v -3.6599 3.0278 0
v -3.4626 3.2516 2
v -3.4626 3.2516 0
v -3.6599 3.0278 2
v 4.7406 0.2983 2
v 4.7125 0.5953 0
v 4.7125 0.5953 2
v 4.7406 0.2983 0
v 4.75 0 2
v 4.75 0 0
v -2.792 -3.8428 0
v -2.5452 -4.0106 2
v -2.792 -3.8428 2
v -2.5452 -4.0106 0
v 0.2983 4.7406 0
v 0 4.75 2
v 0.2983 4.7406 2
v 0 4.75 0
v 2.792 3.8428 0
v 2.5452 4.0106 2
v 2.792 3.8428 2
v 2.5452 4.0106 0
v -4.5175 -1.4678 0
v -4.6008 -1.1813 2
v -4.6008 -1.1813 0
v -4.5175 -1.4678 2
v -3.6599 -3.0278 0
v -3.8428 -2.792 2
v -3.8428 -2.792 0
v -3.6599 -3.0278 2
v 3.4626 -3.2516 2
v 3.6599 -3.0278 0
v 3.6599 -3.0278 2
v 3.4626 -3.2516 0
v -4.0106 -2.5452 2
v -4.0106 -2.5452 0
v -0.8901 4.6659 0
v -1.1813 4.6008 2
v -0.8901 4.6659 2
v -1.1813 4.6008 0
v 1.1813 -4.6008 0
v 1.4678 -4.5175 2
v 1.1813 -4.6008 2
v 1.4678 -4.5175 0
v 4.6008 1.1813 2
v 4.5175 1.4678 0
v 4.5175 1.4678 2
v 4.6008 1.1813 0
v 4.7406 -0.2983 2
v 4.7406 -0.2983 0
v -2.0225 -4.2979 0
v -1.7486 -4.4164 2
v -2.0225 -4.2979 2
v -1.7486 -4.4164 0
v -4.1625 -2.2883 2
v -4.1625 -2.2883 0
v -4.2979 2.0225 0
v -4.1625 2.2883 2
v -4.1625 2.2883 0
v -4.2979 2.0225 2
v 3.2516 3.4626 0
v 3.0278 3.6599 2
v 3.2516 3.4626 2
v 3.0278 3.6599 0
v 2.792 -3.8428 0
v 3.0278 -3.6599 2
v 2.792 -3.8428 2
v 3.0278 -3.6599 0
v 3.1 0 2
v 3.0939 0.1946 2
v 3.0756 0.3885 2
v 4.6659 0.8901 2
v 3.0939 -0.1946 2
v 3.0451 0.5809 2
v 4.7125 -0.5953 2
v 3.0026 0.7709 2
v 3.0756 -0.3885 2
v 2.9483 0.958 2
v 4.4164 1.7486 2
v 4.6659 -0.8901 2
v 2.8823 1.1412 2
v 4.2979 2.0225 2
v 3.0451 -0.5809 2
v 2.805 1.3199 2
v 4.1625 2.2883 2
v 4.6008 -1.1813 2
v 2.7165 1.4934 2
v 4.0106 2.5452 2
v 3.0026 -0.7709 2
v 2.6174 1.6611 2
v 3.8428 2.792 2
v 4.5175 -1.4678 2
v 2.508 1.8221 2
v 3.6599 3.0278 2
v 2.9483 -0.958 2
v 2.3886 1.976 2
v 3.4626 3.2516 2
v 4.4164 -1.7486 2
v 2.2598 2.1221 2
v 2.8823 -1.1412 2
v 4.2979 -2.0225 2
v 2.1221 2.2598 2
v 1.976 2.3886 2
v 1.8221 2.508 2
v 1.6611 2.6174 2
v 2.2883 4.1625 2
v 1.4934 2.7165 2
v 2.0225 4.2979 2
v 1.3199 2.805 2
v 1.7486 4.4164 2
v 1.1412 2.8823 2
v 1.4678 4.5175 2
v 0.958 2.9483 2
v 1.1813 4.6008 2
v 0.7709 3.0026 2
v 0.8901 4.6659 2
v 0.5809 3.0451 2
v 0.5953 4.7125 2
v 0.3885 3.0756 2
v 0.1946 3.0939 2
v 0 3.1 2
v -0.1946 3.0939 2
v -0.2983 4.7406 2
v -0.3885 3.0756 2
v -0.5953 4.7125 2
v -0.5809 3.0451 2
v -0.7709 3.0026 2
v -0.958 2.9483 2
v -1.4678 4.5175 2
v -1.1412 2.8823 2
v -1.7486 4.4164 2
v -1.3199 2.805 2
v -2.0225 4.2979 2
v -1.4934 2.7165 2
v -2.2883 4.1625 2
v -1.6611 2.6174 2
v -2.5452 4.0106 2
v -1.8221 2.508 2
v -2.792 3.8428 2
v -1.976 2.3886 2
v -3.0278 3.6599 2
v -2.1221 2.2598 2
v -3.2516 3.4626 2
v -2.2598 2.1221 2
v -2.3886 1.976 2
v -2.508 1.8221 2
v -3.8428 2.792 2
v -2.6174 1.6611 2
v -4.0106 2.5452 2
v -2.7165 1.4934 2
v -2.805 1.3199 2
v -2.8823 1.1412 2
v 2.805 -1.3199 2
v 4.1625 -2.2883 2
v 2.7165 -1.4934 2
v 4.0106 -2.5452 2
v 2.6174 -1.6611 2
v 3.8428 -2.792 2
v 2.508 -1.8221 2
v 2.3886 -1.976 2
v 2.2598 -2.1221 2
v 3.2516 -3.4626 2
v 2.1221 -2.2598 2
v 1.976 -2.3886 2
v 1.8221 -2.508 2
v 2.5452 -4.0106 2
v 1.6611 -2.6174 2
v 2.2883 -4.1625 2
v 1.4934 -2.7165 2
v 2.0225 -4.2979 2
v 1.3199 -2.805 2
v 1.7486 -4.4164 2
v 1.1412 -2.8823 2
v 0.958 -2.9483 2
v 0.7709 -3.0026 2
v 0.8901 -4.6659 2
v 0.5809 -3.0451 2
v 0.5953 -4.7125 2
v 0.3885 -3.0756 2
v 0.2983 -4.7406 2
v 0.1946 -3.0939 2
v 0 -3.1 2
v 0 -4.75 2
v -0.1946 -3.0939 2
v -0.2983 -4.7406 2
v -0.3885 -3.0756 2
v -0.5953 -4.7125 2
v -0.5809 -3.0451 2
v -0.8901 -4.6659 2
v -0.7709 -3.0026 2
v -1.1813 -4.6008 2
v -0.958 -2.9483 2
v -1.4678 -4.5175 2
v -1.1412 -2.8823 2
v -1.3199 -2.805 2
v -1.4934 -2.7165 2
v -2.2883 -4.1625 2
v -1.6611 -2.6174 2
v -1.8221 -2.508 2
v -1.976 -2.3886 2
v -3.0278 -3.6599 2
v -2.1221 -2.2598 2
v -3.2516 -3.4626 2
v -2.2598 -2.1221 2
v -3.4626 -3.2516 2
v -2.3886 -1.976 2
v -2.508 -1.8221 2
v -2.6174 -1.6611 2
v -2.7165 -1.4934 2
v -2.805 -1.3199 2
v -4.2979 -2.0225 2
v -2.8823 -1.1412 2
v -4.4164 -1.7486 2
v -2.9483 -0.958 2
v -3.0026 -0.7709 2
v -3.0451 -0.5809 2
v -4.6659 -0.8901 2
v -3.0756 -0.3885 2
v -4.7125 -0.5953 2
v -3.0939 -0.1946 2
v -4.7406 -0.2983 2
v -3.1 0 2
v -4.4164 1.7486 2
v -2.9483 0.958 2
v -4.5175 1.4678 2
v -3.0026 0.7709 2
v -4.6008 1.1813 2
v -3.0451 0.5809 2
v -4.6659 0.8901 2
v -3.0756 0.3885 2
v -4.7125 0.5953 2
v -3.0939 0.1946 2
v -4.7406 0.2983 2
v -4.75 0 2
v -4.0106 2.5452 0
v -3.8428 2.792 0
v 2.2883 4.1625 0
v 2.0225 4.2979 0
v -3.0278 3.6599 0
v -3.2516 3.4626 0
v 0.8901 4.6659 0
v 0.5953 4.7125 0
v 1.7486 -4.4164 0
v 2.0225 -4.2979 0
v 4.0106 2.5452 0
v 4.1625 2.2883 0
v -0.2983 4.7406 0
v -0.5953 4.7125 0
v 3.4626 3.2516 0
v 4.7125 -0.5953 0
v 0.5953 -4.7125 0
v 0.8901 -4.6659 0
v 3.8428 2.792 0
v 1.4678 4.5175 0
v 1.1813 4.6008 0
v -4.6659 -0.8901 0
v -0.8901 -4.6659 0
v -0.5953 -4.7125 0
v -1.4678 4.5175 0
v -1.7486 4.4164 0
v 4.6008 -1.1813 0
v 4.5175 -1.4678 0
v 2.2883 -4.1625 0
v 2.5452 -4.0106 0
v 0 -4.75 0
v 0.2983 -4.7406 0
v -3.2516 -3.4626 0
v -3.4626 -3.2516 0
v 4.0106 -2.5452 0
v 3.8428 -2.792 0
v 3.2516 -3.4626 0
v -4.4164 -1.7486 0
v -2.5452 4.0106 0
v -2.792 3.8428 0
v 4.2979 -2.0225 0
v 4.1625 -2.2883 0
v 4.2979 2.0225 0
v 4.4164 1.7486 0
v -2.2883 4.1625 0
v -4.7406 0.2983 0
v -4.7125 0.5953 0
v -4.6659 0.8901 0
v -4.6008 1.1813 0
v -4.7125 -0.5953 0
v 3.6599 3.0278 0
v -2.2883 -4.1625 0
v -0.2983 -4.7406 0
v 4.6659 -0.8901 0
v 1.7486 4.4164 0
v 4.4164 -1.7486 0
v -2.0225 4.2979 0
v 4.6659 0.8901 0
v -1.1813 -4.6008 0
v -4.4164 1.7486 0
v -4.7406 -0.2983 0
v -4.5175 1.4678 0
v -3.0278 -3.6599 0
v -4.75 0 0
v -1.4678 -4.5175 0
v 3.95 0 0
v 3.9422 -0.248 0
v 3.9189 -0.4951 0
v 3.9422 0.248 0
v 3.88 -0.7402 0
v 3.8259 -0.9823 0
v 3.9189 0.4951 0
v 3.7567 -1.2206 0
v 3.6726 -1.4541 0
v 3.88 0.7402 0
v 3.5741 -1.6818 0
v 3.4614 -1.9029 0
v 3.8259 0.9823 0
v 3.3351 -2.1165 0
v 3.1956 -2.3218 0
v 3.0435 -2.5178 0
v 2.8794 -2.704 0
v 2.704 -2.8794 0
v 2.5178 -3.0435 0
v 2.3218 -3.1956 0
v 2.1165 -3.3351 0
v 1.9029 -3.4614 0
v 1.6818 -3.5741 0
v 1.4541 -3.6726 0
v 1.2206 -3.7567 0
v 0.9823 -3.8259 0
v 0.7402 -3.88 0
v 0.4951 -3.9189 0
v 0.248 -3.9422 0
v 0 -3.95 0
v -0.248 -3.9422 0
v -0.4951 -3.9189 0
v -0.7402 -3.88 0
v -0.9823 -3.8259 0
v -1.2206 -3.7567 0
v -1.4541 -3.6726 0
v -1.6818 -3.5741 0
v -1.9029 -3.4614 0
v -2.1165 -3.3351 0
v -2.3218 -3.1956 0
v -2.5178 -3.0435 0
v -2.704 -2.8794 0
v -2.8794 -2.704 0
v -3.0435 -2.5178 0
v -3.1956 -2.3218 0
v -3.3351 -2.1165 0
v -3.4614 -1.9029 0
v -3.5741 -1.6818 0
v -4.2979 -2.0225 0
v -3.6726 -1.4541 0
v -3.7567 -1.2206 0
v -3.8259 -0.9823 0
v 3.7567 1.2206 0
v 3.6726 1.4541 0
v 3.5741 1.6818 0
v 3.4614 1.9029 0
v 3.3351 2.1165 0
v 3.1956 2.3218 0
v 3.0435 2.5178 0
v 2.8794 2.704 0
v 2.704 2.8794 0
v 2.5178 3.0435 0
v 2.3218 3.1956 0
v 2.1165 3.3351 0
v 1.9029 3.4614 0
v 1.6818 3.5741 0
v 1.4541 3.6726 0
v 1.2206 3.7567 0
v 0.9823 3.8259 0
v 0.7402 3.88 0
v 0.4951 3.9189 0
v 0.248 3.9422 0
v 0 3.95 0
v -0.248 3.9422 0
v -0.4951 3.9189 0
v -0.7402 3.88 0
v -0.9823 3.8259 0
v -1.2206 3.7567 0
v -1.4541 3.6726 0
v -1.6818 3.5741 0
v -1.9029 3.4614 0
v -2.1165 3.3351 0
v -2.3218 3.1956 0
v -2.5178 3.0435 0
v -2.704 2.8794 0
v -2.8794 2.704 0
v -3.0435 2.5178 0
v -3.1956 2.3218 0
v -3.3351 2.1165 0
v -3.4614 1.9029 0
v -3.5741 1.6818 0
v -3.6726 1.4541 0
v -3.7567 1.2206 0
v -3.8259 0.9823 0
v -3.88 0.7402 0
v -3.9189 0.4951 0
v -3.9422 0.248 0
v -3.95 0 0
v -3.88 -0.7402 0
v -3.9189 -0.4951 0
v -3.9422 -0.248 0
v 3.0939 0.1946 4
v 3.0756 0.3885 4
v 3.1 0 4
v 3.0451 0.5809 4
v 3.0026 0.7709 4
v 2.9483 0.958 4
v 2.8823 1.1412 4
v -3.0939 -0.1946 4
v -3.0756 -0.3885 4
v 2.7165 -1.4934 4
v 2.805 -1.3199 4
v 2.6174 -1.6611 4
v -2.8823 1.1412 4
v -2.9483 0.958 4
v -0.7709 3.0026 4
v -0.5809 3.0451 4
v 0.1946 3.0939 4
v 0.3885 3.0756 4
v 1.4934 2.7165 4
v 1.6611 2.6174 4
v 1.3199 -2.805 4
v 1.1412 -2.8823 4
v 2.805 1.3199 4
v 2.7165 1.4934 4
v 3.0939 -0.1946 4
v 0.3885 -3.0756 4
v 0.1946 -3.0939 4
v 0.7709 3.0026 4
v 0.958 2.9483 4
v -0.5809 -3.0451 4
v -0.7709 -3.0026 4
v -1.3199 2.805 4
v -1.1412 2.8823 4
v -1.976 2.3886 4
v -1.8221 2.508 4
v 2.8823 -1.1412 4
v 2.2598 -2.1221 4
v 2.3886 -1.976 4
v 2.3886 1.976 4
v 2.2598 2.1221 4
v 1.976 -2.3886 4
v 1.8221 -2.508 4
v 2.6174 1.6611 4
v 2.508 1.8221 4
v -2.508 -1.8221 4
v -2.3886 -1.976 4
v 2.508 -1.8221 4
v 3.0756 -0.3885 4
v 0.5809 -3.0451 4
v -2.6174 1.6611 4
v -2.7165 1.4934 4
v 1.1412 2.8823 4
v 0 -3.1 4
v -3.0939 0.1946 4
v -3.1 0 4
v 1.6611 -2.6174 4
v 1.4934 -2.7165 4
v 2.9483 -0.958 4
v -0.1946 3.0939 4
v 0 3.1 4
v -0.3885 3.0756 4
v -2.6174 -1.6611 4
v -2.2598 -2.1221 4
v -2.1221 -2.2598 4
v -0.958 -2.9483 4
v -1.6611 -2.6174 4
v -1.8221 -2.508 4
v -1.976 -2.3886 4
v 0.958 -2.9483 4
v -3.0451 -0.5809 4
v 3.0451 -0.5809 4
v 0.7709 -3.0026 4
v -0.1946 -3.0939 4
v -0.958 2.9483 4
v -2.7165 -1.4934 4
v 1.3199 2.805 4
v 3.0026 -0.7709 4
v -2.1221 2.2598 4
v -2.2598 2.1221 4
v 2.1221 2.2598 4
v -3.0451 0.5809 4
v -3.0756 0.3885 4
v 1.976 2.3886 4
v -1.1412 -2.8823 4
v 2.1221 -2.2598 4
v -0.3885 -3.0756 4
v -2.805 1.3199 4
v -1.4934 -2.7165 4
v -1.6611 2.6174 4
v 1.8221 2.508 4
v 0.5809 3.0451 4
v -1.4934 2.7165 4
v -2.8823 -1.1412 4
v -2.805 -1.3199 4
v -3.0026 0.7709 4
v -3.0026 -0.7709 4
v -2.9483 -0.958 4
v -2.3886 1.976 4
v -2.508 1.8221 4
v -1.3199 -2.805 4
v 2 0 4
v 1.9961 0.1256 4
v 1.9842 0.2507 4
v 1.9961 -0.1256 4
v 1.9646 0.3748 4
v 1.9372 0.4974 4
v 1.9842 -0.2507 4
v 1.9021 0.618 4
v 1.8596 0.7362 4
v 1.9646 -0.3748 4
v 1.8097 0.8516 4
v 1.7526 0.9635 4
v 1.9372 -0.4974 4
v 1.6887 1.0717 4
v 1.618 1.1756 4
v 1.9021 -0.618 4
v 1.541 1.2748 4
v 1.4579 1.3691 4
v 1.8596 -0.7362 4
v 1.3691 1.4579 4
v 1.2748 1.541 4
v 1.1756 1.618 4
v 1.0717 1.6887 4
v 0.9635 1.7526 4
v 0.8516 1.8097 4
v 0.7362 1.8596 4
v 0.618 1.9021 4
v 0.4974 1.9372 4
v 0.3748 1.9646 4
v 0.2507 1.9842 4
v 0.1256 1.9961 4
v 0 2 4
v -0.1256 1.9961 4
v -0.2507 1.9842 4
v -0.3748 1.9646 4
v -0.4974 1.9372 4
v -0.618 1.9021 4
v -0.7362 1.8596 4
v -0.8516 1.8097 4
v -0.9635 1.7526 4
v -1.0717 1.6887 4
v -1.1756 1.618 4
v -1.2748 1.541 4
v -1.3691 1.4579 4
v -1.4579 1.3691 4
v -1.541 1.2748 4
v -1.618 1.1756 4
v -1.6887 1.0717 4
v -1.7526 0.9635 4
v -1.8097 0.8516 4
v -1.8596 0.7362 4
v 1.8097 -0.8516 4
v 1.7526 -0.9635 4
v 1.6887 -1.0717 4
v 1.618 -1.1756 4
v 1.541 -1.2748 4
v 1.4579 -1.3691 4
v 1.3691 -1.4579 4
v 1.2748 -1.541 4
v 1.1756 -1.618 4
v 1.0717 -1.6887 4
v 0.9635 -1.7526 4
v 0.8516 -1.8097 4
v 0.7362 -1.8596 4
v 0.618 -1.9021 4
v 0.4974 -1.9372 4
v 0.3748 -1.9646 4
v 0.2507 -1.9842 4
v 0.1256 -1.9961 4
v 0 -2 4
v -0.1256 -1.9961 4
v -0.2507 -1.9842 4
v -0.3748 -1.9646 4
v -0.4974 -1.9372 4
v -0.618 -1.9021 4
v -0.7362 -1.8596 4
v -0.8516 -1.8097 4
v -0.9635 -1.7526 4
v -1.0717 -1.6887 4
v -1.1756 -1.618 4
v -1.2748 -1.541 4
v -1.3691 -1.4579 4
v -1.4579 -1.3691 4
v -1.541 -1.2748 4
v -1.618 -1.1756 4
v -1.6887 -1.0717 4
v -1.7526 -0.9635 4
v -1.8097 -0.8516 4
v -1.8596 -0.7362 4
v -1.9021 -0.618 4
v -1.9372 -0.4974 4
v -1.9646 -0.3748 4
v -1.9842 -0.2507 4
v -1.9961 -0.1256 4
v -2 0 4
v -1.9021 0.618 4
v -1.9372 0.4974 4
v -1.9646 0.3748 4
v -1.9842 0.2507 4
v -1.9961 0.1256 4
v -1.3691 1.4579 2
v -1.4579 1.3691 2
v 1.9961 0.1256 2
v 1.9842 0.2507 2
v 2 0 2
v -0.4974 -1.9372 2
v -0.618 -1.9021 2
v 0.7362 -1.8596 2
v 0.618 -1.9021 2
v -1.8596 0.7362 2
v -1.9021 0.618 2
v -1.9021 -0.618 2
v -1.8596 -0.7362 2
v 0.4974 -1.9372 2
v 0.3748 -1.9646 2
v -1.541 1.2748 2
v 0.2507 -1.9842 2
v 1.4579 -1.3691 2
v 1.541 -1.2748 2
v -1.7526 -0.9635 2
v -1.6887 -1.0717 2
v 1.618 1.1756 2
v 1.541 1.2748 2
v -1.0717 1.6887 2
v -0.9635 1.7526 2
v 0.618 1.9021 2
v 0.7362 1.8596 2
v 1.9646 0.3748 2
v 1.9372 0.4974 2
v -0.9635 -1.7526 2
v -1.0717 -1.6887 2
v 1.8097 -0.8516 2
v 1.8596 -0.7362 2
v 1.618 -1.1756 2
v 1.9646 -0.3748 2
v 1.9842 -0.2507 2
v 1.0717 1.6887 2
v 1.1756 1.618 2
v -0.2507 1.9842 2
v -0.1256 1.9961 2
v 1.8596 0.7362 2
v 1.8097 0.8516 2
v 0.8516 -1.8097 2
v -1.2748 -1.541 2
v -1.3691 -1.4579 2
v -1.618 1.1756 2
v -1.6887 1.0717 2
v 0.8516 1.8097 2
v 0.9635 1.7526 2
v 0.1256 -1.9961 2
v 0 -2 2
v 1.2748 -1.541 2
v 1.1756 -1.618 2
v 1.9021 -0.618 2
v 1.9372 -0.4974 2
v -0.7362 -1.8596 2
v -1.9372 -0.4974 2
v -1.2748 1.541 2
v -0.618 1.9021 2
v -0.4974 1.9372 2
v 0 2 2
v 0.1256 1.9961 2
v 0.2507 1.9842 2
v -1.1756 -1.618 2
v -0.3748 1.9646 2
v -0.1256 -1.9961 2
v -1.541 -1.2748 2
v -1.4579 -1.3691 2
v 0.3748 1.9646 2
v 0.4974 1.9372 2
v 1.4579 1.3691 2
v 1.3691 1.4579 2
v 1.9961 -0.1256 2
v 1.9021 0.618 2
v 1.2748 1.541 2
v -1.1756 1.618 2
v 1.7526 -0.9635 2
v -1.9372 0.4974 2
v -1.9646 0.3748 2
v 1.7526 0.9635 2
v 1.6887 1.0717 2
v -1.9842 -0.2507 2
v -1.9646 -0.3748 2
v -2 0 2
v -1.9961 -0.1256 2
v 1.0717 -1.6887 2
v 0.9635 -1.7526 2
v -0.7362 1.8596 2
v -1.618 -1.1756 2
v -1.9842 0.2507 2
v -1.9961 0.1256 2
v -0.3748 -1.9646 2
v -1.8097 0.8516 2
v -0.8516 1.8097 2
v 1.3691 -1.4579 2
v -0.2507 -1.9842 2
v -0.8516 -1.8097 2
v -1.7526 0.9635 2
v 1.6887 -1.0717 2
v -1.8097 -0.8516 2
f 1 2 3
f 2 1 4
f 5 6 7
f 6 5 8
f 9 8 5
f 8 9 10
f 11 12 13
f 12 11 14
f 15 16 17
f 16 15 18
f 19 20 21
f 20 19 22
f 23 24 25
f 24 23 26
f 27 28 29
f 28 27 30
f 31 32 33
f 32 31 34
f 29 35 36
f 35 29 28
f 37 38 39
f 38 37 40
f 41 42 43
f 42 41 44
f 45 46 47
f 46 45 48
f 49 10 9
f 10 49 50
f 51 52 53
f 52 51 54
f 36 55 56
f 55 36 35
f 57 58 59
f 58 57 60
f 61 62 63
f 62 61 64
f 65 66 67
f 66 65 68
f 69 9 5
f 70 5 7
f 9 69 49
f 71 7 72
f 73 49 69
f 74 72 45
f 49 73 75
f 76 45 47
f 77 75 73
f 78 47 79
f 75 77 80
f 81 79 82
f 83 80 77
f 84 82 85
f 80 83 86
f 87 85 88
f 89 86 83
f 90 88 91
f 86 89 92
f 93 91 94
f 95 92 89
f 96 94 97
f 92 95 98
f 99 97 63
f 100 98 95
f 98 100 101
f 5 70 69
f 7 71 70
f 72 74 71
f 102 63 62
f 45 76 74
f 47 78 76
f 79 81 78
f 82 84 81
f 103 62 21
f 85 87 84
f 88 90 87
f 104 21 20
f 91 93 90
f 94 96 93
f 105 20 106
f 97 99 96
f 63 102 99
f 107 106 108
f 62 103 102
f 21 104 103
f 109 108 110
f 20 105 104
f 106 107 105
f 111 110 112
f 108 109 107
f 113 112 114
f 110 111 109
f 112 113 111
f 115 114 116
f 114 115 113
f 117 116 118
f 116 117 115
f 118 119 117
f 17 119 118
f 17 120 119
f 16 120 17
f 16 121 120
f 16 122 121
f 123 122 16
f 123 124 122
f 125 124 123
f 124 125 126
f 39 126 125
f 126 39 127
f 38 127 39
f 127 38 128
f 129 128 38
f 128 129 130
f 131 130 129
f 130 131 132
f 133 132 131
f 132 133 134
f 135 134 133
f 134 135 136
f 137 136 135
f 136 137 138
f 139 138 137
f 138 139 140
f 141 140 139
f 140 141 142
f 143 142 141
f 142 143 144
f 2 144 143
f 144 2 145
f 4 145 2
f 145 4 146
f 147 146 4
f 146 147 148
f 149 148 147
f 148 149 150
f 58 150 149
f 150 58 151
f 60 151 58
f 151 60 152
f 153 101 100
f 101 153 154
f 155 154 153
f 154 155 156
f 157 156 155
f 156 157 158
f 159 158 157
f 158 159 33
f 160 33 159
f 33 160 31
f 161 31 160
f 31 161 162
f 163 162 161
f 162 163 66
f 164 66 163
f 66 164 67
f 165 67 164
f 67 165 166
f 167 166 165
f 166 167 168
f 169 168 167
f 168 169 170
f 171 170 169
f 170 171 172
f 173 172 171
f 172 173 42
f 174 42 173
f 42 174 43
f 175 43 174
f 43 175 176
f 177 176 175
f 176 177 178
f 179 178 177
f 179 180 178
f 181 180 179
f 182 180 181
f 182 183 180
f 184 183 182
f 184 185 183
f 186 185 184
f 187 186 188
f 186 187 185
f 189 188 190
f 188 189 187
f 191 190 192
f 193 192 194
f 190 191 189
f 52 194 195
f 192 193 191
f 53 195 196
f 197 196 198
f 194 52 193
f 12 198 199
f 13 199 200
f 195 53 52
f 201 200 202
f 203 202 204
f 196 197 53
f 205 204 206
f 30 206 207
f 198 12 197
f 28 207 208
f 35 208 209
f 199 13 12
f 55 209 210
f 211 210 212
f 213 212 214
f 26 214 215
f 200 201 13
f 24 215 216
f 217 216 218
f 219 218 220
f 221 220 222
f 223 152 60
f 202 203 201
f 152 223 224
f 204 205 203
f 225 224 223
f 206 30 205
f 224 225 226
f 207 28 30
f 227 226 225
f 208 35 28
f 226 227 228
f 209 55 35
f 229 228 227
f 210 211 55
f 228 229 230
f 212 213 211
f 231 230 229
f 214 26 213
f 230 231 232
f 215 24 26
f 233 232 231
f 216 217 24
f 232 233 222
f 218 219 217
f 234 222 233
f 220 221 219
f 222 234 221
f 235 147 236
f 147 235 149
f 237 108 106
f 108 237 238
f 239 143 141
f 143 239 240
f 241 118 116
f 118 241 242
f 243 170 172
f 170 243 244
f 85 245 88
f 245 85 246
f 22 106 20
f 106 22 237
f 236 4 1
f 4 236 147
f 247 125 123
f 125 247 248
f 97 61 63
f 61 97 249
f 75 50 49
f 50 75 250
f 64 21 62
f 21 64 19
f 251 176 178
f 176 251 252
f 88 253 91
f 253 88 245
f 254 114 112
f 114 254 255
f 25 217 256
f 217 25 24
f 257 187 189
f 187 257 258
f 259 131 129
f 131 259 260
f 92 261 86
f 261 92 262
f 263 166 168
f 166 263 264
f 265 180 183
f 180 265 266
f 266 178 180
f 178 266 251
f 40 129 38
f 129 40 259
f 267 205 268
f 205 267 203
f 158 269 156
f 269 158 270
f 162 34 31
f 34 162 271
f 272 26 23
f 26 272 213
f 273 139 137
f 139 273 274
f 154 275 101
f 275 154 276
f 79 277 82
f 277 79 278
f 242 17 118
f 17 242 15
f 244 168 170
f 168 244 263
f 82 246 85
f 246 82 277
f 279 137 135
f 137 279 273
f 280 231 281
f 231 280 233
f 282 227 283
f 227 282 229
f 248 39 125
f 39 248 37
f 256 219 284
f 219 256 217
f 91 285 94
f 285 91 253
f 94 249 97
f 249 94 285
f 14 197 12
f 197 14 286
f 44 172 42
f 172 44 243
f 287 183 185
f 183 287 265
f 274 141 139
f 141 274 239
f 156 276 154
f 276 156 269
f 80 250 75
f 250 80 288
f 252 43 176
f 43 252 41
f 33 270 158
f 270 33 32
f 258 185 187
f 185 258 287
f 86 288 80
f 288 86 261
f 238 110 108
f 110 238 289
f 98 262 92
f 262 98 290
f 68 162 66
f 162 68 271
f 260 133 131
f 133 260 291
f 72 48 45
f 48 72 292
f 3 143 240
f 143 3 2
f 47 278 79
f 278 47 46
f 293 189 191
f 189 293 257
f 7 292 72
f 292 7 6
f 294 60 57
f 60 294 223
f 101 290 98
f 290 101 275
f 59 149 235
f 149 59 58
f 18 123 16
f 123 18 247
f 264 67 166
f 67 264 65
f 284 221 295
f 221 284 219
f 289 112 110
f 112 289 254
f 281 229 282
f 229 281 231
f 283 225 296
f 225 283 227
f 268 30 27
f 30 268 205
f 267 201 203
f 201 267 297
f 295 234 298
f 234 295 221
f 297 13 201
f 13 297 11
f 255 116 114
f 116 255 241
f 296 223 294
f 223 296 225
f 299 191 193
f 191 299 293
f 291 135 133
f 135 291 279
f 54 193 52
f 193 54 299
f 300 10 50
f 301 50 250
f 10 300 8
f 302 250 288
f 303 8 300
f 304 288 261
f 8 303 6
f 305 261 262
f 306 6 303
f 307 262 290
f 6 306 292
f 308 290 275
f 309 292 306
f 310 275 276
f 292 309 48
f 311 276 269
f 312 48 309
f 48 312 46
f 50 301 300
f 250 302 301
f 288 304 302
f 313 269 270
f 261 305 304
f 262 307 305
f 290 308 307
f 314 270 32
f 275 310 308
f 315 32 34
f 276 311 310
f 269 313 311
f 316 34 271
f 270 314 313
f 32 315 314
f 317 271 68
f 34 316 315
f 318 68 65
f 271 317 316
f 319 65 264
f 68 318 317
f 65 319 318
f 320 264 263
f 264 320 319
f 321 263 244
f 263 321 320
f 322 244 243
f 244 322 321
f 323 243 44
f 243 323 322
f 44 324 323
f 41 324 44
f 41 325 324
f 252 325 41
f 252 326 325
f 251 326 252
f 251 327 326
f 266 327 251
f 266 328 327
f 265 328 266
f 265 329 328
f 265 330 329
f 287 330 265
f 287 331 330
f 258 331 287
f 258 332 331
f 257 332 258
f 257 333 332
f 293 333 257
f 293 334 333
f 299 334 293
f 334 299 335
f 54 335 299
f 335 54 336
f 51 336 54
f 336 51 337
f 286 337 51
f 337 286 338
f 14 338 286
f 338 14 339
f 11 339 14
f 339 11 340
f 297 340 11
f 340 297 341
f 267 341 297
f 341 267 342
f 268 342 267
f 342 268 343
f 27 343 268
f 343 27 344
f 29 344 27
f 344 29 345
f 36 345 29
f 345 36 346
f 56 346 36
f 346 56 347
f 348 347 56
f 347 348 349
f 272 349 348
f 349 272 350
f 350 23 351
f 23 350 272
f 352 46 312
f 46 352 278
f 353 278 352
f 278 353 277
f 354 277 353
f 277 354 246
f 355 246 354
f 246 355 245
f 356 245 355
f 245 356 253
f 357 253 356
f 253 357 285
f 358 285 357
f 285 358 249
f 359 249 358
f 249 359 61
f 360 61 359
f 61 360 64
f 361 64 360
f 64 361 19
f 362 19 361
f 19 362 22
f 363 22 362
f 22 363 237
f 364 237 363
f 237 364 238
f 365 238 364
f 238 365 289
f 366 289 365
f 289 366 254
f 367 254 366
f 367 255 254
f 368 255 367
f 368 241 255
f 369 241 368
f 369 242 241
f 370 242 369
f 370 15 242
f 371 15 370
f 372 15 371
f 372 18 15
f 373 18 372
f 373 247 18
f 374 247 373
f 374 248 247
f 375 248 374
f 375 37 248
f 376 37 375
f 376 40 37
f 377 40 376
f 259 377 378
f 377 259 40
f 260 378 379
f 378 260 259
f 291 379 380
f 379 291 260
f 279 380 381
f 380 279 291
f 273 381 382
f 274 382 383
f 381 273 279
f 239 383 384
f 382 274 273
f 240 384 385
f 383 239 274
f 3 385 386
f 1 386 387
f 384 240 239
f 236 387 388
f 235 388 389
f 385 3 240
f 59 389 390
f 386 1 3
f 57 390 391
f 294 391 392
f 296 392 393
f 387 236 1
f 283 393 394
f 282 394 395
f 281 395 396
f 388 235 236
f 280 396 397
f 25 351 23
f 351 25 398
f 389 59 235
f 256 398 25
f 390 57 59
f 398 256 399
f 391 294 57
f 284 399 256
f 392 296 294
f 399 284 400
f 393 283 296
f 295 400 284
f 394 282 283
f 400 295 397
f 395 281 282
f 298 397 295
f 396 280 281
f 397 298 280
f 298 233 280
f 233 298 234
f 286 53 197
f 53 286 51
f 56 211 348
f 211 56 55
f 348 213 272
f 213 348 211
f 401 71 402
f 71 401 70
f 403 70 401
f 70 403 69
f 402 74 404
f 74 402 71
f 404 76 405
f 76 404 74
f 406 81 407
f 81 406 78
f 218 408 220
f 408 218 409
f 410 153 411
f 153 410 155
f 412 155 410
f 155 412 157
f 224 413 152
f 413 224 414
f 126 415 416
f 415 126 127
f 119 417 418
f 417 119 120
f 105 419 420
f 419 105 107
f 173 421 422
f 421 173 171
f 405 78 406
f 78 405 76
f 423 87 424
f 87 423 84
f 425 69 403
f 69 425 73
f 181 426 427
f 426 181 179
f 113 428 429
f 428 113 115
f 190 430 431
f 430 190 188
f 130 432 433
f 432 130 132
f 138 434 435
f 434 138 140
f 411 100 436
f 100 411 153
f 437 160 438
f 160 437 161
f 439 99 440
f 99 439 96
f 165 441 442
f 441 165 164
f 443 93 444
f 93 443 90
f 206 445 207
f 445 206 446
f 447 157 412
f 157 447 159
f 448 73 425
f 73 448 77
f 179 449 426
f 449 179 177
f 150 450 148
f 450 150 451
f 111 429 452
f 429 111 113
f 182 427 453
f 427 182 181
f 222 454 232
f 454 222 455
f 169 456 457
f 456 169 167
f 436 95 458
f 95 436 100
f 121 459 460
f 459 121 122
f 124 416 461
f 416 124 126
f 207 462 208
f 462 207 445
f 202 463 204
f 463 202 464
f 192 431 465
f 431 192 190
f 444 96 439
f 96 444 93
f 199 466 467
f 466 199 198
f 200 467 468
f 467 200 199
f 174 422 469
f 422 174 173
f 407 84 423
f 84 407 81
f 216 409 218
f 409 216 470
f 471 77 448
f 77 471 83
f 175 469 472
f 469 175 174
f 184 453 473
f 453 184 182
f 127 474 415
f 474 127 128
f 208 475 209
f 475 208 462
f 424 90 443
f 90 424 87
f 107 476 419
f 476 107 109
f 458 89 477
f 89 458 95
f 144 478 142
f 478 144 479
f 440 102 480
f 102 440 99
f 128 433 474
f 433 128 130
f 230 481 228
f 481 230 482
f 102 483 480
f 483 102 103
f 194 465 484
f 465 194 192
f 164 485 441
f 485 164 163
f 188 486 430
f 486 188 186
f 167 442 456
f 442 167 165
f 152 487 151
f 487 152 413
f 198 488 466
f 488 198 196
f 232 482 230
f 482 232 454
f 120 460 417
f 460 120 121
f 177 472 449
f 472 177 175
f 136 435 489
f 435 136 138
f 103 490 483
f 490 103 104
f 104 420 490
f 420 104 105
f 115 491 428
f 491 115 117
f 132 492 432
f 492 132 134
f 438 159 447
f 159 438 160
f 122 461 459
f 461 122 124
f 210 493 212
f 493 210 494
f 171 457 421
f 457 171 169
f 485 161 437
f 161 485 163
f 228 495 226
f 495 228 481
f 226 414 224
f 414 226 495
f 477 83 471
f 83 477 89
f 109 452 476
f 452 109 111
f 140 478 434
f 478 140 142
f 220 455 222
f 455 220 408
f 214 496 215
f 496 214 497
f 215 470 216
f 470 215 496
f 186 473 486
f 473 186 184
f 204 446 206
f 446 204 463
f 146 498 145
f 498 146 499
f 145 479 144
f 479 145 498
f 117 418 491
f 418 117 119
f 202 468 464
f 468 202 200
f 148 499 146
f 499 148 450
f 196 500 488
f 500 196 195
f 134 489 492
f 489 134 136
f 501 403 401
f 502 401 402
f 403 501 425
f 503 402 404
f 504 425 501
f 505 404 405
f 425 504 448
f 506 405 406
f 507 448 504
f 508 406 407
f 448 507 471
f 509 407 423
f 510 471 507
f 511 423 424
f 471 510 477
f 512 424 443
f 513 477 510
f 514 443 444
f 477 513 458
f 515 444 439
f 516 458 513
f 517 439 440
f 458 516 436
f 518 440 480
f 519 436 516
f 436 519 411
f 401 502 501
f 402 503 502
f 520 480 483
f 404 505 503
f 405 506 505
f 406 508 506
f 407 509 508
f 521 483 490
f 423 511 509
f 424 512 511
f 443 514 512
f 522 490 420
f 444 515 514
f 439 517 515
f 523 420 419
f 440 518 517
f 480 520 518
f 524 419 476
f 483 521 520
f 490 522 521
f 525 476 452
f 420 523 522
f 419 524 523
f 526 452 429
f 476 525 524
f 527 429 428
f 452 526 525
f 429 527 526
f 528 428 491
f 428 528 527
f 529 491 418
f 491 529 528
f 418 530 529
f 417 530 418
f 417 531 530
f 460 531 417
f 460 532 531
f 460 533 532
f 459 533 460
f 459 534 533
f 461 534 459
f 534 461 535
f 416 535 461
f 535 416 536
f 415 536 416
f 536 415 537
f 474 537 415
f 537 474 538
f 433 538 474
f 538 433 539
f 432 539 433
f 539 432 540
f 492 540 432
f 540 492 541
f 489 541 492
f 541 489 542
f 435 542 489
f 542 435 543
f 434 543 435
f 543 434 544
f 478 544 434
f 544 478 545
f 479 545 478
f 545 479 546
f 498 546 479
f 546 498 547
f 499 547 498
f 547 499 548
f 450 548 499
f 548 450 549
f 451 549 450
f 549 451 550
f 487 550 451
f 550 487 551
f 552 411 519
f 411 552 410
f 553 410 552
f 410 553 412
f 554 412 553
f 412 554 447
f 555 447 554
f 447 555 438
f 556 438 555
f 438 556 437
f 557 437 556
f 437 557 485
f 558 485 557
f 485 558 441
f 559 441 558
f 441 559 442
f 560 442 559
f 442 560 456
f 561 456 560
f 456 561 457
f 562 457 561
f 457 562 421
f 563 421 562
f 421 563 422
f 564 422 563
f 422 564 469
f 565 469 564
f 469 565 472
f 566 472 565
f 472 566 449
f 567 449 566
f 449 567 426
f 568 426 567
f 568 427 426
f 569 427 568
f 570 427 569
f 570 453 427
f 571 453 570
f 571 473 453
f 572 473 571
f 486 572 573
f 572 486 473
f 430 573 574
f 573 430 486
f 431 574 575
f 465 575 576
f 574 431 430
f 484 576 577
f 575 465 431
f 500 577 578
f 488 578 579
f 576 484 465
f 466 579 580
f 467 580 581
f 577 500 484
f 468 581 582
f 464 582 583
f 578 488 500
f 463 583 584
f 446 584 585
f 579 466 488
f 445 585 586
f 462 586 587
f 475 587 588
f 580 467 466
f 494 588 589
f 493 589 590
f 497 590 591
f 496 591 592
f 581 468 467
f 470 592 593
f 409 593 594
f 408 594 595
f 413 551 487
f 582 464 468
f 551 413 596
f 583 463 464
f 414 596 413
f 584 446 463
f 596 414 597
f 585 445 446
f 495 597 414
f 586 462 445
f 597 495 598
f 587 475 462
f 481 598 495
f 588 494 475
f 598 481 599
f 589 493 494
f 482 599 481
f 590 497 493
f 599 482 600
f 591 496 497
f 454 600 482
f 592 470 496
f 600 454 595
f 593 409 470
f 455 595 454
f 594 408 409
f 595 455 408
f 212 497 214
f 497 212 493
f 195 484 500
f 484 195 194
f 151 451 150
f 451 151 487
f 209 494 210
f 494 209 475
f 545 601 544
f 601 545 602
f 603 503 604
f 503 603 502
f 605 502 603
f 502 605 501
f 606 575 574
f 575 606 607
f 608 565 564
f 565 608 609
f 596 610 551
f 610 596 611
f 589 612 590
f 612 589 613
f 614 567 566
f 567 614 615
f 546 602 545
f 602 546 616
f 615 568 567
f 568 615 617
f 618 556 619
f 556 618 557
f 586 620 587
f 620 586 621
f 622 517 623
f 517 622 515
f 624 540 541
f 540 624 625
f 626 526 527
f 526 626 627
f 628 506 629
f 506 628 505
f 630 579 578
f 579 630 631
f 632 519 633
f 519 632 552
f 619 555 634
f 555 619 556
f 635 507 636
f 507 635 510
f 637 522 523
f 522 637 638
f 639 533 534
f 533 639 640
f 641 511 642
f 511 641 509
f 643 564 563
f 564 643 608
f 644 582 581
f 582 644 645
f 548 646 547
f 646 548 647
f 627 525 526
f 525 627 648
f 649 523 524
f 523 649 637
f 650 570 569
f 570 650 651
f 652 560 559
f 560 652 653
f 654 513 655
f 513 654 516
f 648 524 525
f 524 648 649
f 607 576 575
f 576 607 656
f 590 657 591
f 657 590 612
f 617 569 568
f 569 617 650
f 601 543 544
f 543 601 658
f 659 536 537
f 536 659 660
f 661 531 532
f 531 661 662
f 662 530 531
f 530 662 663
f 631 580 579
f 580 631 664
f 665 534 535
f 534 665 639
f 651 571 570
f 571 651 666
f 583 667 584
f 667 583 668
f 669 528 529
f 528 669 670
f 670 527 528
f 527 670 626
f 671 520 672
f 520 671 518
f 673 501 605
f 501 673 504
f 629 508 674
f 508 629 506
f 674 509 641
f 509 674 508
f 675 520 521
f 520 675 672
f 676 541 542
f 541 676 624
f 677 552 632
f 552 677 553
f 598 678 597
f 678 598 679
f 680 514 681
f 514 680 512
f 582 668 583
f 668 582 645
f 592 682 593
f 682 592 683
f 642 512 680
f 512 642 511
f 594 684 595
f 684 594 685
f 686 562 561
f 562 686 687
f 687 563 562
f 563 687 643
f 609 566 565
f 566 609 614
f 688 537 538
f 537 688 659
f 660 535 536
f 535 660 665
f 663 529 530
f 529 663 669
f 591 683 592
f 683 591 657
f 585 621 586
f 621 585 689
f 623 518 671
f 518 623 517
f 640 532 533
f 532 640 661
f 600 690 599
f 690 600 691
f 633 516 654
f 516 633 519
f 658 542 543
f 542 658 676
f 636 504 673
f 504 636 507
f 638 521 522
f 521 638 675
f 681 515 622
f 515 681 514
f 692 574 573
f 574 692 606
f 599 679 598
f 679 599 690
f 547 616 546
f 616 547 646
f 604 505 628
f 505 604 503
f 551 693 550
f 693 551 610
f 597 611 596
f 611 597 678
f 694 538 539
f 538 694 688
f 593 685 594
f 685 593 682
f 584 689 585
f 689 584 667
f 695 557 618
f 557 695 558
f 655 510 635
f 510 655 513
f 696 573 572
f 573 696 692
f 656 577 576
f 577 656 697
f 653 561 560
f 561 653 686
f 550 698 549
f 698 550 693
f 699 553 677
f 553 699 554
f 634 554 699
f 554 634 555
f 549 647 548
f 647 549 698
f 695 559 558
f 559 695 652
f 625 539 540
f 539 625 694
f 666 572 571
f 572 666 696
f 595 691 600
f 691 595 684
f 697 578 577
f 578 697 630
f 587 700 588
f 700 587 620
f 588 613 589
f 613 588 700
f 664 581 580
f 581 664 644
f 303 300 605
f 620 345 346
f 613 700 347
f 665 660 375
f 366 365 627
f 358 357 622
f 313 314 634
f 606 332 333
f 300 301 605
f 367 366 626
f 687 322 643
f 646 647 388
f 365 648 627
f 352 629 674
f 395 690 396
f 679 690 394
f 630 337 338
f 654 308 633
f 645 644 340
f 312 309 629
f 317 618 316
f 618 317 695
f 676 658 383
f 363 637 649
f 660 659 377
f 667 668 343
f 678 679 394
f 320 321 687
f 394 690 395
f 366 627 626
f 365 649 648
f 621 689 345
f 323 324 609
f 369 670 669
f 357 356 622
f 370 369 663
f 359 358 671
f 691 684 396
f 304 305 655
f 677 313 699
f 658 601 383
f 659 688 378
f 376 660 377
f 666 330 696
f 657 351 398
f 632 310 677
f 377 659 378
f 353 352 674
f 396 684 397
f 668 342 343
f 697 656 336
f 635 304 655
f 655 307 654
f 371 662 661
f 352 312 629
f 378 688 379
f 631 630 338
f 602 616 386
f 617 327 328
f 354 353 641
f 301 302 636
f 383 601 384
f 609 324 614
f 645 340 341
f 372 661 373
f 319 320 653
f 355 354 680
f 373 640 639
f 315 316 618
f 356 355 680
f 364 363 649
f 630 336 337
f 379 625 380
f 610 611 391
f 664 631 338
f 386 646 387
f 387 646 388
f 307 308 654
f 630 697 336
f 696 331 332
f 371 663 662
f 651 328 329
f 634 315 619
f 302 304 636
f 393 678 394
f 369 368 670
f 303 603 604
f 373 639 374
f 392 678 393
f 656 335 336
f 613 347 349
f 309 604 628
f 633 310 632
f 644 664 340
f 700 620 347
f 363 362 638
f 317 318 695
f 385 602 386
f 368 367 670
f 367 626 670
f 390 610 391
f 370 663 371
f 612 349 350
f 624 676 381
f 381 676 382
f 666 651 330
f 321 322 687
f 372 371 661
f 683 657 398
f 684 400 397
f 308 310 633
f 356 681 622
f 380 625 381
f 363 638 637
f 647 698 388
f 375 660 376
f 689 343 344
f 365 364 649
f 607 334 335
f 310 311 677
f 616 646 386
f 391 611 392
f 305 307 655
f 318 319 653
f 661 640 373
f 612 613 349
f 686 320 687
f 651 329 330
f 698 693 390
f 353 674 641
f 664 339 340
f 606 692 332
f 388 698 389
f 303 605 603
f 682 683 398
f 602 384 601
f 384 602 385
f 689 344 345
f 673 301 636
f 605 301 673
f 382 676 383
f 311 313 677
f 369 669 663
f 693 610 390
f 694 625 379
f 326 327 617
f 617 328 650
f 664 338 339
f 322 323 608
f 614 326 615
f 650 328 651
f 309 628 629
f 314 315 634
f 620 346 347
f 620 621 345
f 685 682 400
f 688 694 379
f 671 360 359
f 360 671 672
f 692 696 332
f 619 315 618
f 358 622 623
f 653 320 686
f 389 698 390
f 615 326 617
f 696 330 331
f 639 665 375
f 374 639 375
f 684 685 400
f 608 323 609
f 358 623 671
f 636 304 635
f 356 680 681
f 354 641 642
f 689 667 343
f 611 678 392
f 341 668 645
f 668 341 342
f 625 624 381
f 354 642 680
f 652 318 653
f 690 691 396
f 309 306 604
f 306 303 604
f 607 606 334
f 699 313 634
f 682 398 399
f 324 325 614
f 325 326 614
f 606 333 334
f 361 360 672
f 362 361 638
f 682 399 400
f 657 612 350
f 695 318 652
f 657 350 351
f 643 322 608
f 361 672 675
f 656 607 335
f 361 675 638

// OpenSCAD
resolution = 100;
module but () {cylinder (r=9.5/2,h=2, $fn=resolution);

/*translate([0,0,6]) cylinder (r=9.5/2,h=2, $fn=resolution);*/

cylinder (r=6.2/2,h=8/2, $fn=resolution);
}


difference () {
but();
cylinder (r=4/2,h=8, $fn=resolution);
/*translate ([0,0,6])*/ cylinder (r1=7.9/2, r2=4/2, h=2, $fn=resolution);
}
